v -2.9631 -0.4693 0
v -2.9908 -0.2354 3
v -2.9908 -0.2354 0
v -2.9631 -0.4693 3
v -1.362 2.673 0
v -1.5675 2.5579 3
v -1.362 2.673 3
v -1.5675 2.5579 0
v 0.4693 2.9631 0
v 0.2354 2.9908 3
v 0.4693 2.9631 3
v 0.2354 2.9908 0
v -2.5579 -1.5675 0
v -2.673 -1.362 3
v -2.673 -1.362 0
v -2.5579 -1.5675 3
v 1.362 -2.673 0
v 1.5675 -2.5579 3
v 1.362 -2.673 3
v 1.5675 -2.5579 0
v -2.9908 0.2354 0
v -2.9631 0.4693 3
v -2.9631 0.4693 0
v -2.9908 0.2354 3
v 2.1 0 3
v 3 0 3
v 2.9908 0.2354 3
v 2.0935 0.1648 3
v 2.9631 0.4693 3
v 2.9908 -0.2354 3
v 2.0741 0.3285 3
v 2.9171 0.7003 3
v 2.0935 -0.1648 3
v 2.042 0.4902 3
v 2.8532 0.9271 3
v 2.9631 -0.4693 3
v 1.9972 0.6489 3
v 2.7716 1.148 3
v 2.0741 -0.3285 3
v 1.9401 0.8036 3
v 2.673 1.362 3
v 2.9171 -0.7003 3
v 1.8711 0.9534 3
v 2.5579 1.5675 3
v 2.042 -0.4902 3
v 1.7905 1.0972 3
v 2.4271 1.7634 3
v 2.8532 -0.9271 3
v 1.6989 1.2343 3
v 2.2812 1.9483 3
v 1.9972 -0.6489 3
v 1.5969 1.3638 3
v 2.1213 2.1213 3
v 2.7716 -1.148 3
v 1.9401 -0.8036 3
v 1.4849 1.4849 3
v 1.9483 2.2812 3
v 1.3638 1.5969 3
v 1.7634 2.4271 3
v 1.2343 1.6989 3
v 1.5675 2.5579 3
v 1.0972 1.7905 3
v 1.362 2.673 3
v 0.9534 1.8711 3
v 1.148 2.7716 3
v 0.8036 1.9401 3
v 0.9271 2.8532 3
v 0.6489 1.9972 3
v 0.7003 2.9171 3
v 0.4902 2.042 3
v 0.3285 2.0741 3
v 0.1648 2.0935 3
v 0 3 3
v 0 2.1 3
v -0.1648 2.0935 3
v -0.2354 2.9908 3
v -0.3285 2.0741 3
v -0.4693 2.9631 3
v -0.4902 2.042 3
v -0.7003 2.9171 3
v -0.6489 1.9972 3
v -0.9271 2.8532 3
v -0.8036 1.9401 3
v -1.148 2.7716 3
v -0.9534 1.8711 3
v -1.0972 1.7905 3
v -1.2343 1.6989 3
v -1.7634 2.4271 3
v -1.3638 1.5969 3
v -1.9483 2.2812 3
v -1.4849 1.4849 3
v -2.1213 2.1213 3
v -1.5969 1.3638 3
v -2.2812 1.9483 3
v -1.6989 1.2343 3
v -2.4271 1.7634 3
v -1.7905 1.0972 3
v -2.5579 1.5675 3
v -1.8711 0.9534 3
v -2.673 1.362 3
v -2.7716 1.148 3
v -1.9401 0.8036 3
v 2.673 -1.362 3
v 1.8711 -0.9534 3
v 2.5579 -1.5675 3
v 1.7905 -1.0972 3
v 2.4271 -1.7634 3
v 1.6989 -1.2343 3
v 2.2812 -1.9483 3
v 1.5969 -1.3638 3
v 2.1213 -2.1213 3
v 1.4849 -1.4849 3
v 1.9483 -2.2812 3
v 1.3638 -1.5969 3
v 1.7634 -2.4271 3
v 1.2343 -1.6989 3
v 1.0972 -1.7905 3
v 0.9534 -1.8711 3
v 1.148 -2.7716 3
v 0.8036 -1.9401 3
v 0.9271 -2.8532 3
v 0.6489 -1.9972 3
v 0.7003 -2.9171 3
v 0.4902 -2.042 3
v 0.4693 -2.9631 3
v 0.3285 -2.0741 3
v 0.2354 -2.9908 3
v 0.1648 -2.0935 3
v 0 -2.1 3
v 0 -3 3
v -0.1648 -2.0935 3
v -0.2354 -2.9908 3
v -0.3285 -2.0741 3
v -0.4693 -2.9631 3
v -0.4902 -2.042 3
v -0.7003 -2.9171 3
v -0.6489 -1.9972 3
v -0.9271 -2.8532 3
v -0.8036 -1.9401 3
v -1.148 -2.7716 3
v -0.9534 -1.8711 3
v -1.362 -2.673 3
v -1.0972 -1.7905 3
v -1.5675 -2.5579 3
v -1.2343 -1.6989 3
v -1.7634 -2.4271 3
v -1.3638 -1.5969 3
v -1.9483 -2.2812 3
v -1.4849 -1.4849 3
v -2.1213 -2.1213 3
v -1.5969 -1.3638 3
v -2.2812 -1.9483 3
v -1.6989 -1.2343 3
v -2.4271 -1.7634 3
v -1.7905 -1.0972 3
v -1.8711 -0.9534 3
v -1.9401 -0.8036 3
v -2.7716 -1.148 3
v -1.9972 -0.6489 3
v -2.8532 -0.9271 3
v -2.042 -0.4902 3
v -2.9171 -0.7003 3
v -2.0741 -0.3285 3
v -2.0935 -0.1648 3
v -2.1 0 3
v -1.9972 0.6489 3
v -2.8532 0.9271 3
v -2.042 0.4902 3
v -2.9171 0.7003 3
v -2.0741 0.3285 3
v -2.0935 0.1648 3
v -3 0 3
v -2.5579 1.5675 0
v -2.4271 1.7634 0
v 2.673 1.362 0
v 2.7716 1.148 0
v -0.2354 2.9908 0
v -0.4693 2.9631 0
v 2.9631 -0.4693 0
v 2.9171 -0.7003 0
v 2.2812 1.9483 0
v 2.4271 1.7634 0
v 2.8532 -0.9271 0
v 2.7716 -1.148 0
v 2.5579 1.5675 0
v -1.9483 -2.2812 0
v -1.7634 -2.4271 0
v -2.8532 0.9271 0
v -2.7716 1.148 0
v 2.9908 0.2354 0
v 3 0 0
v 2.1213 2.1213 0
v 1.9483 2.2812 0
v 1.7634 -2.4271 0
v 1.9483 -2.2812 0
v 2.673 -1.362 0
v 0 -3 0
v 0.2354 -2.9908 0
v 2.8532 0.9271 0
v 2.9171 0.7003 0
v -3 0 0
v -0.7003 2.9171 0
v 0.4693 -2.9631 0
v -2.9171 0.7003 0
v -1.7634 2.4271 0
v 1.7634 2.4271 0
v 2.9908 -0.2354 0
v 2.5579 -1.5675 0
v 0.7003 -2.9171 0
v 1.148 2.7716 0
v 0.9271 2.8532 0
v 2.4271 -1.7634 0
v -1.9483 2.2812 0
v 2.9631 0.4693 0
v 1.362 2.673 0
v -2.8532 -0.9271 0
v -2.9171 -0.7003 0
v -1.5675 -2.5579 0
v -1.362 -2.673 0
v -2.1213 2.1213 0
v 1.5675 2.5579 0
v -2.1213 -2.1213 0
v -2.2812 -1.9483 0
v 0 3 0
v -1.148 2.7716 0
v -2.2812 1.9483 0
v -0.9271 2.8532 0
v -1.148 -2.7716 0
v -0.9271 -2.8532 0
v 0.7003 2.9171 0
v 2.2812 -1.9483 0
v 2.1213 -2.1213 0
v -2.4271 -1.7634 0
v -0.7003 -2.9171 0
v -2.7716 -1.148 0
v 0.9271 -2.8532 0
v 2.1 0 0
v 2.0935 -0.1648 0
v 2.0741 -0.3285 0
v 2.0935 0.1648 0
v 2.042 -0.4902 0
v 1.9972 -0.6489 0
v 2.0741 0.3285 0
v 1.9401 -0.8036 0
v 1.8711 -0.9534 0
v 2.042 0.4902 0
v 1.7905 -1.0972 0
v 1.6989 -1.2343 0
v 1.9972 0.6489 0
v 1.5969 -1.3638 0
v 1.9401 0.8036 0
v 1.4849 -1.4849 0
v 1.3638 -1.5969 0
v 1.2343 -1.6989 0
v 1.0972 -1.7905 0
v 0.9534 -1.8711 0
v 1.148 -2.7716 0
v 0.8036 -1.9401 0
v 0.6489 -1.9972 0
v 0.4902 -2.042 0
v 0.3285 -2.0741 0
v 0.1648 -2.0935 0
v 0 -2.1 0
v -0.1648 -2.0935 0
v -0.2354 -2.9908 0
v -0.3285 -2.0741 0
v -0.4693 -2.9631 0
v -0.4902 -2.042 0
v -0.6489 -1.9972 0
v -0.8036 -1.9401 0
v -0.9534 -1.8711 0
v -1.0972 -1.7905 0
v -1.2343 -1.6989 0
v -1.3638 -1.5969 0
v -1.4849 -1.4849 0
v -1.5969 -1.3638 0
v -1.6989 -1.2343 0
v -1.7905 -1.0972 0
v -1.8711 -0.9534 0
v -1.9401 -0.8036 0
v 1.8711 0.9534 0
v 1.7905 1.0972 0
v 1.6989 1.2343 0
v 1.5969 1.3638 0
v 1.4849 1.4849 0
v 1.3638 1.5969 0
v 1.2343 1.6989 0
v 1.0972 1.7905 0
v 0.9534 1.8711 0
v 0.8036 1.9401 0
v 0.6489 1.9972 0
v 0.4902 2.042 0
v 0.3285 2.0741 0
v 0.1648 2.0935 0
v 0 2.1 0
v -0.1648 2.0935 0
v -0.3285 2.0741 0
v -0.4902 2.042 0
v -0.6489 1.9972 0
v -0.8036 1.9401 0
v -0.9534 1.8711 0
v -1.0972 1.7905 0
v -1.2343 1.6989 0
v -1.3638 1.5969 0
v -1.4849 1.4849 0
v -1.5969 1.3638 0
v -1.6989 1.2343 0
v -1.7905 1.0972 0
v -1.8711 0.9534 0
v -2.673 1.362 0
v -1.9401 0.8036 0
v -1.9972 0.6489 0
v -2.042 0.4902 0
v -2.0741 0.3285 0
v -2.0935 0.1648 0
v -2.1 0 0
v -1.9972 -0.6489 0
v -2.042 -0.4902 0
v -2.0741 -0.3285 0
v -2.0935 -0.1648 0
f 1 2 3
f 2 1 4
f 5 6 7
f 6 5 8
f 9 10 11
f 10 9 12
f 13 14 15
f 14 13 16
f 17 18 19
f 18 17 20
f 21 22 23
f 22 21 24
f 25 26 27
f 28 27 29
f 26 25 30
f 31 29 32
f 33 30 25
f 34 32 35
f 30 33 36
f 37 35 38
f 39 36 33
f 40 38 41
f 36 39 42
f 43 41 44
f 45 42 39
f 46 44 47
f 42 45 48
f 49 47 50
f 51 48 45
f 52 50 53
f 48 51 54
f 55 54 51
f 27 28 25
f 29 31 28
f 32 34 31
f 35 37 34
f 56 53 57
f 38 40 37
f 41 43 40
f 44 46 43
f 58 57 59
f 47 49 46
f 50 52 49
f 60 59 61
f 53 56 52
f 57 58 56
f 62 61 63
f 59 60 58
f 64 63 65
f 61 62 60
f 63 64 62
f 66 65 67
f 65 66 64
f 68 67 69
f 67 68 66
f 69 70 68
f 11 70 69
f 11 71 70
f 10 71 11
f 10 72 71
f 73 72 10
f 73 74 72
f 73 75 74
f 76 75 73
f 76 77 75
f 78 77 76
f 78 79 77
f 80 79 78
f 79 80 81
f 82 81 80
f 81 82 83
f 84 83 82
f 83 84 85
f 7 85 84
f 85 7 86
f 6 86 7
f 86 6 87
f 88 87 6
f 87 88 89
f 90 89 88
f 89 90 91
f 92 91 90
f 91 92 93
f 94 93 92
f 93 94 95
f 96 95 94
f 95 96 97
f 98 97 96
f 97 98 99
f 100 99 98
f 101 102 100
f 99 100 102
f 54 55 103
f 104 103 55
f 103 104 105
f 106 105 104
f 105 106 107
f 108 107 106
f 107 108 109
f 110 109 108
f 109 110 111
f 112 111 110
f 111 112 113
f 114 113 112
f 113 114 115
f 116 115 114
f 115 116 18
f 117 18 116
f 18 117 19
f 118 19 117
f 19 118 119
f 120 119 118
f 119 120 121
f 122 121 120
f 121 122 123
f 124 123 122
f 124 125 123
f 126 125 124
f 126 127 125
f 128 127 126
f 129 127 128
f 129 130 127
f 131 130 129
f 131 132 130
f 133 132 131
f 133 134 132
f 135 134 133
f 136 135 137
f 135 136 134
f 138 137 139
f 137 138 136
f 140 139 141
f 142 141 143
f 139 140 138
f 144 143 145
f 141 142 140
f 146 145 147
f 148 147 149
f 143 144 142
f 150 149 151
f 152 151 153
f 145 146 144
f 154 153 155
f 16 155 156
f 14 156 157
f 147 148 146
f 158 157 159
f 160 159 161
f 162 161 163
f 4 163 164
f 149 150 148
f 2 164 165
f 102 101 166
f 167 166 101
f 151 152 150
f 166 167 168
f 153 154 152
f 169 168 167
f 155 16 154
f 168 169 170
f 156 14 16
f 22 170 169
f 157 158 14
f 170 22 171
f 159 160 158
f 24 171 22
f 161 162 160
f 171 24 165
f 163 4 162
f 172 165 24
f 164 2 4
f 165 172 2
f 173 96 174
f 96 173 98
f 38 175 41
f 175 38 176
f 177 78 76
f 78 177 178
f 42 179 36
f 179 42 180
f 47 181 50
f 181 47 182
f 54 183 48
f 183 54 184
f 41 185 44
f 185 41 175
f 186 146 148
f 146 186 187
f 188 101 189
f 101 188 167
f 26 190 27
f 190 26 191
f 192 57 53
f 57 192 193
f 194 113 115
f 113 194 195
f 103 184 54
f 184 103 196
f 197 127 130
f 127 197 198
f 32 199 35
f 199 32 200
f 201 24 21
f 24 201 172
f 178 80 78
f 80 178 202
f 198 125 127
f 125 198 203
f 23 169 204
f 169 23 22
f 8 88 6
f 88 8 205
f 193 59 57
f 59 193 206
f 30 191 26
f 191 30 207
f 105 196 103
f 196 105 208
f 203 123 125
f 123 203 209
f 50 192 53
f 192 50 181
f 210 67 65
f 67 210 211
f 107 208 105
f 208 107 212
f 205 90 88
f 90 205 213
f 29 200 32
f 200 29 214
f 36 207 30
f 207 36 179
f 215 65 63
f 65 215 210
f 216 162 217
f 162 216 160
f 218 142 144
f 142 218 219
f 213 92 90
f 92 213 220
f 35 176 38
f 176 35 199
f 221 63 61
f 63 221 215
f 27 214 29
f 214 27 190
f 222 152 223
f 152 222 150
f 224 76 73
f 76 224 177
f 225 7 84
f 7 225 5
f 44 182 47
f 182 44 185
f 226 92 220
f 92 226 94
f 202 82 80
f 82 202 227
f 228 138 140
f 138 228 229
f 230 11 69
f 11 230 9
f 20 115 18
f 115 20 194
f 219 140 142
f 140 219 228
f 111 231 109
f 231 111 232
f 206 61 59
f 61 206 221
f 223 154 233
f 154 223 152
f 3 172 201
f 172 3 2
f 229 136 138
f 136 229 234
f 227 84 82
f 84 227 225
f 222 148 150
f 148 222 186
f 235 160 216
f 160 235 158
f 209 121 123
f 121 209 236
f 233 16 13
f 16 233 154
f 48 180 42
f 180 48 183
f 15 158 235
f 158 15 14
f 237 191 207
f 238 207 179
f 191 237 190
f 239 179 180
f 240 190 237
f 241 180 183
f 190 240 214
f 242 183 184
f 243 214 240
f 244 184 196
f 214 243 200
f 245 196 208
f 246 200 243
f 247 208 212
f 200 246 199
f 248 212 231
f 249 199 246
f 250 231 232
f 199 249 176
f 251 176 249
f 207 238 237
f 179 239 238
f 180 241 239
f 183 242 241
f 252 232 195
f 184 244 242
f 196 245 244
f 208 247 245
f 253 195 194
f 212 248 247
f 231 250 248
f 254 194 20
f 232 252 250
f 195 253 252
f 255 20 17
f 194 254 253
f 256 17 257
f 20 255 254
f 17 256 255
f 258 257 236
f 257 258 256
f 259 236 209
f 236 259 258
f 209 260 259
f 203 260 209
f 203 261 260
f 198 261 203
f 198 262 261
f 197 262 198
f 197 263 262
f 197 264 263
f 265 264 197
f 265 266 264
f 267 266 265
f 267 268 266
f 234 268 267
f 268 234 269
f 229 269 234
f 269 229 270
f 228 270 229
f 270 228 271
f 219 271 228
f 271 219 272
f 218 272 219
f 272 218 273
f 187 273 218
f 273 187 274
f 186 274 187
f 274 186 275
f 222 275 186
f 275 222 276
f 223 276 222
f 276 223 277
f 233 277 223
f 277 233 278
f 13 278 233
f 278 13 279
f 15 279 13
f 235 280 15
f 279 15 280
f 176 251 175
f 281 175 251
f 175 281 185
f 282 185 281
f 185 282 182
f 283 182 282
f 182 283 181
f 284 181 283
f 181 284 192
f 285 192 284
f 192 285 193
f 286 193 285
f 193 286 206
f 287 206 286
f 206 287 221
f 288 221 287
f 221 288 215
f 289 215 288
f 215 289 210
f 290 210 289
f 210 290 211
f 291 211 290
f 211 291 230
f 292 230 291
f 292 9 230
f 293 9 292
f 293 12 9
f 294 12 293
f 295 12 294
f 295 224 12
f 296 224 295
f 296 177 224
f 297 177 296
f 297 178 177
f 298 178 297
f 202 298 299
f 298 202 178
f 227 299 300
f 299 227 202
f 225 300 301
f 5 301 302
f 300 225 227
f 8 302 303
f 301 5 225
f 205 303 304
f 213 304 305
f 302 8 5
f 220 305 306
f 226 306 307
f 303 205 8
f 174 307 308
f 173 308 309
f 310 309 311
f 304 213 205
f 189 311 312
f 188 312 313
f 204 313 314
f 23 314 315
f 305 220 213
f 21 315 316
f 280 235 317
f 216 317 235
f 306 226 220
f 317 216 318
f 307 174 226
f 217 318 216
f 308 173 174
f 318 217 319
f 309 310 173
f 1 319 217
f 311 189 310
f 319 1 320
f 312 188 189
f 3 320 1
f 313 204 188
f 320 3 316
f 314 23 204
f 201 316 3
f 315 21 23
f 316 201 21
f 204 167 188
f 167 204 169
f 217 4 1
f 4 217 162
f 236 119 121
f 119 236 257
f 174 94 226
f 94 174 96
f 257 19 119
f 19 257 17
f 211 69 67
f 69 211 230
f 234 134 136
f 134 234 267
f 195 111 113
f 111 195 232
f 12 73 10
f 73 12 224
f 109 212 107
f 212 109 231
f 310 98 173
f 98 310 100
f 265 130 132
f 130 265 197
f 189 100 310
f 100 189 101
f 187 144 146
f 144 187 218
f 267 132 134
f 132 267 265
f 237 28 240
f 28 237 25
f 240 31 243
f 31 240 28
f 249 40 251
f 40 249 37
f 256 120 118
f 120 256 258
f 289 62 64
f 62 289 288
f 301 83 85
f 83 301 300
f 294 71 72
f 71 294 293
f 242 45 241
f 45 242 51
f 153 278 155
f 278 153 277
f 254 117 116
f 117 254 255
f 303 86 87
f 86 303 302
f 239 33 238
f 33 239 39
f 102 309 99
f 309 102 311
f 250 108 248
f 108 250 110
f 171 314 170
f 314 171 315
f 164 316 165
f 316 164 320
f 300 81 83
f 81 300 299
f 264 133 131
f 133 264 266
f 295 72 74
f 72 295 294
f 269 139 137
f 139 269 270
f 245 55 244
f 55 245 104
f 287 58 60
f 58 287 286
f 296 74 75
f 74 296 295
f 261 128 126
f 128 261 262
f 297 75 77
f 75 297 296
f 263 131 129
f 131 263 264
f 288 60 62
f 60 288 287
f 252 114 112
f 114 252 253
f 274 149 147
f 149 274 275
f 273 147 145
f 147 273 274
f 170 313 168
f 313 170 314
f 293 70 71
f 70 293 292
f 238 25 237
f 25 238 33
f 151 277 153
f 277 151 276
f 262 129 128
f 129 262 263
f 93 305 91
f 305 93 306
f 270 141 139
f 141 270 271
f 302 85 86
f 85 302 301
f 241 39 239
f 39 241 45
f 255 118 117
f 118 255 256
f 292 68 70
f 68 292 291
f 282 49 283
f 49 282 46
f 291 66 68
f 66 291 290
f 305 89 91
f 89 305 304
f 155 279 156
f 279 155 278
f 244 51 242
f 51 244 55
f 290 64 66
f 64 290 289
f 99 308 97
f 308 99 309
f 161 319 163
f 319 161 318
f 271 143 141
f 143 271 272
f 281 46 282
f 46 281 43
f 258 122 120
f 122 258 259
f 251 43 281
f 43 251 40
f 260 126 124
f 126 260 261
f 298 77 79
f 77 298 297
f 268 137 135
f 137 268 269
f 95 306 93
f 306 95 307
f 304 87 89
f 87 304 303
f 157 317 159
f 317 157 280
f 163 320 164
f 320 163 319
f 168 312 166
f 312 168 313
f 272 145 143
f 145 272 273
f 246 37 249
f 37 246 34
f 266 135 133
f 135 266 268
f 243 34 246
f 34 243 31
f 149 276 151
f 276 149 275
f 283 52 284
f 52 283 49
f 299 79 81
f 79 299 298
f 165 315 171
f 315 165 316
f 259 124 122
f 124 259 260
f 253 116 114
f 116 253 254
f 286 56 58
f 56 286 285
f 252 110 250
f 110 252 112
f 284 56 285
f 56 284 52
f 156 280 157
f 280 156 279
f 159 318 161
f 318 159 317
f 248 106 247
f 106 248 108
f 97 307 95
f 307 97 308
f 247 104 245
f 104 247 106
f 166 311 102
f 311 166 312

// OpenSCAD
//M4 washer electronic board

$fn=80;

difference() {
    cylinder(d=6, h=3);
    translate([0, 0, -1]) cylinder(d=4.2, h=5);
}
